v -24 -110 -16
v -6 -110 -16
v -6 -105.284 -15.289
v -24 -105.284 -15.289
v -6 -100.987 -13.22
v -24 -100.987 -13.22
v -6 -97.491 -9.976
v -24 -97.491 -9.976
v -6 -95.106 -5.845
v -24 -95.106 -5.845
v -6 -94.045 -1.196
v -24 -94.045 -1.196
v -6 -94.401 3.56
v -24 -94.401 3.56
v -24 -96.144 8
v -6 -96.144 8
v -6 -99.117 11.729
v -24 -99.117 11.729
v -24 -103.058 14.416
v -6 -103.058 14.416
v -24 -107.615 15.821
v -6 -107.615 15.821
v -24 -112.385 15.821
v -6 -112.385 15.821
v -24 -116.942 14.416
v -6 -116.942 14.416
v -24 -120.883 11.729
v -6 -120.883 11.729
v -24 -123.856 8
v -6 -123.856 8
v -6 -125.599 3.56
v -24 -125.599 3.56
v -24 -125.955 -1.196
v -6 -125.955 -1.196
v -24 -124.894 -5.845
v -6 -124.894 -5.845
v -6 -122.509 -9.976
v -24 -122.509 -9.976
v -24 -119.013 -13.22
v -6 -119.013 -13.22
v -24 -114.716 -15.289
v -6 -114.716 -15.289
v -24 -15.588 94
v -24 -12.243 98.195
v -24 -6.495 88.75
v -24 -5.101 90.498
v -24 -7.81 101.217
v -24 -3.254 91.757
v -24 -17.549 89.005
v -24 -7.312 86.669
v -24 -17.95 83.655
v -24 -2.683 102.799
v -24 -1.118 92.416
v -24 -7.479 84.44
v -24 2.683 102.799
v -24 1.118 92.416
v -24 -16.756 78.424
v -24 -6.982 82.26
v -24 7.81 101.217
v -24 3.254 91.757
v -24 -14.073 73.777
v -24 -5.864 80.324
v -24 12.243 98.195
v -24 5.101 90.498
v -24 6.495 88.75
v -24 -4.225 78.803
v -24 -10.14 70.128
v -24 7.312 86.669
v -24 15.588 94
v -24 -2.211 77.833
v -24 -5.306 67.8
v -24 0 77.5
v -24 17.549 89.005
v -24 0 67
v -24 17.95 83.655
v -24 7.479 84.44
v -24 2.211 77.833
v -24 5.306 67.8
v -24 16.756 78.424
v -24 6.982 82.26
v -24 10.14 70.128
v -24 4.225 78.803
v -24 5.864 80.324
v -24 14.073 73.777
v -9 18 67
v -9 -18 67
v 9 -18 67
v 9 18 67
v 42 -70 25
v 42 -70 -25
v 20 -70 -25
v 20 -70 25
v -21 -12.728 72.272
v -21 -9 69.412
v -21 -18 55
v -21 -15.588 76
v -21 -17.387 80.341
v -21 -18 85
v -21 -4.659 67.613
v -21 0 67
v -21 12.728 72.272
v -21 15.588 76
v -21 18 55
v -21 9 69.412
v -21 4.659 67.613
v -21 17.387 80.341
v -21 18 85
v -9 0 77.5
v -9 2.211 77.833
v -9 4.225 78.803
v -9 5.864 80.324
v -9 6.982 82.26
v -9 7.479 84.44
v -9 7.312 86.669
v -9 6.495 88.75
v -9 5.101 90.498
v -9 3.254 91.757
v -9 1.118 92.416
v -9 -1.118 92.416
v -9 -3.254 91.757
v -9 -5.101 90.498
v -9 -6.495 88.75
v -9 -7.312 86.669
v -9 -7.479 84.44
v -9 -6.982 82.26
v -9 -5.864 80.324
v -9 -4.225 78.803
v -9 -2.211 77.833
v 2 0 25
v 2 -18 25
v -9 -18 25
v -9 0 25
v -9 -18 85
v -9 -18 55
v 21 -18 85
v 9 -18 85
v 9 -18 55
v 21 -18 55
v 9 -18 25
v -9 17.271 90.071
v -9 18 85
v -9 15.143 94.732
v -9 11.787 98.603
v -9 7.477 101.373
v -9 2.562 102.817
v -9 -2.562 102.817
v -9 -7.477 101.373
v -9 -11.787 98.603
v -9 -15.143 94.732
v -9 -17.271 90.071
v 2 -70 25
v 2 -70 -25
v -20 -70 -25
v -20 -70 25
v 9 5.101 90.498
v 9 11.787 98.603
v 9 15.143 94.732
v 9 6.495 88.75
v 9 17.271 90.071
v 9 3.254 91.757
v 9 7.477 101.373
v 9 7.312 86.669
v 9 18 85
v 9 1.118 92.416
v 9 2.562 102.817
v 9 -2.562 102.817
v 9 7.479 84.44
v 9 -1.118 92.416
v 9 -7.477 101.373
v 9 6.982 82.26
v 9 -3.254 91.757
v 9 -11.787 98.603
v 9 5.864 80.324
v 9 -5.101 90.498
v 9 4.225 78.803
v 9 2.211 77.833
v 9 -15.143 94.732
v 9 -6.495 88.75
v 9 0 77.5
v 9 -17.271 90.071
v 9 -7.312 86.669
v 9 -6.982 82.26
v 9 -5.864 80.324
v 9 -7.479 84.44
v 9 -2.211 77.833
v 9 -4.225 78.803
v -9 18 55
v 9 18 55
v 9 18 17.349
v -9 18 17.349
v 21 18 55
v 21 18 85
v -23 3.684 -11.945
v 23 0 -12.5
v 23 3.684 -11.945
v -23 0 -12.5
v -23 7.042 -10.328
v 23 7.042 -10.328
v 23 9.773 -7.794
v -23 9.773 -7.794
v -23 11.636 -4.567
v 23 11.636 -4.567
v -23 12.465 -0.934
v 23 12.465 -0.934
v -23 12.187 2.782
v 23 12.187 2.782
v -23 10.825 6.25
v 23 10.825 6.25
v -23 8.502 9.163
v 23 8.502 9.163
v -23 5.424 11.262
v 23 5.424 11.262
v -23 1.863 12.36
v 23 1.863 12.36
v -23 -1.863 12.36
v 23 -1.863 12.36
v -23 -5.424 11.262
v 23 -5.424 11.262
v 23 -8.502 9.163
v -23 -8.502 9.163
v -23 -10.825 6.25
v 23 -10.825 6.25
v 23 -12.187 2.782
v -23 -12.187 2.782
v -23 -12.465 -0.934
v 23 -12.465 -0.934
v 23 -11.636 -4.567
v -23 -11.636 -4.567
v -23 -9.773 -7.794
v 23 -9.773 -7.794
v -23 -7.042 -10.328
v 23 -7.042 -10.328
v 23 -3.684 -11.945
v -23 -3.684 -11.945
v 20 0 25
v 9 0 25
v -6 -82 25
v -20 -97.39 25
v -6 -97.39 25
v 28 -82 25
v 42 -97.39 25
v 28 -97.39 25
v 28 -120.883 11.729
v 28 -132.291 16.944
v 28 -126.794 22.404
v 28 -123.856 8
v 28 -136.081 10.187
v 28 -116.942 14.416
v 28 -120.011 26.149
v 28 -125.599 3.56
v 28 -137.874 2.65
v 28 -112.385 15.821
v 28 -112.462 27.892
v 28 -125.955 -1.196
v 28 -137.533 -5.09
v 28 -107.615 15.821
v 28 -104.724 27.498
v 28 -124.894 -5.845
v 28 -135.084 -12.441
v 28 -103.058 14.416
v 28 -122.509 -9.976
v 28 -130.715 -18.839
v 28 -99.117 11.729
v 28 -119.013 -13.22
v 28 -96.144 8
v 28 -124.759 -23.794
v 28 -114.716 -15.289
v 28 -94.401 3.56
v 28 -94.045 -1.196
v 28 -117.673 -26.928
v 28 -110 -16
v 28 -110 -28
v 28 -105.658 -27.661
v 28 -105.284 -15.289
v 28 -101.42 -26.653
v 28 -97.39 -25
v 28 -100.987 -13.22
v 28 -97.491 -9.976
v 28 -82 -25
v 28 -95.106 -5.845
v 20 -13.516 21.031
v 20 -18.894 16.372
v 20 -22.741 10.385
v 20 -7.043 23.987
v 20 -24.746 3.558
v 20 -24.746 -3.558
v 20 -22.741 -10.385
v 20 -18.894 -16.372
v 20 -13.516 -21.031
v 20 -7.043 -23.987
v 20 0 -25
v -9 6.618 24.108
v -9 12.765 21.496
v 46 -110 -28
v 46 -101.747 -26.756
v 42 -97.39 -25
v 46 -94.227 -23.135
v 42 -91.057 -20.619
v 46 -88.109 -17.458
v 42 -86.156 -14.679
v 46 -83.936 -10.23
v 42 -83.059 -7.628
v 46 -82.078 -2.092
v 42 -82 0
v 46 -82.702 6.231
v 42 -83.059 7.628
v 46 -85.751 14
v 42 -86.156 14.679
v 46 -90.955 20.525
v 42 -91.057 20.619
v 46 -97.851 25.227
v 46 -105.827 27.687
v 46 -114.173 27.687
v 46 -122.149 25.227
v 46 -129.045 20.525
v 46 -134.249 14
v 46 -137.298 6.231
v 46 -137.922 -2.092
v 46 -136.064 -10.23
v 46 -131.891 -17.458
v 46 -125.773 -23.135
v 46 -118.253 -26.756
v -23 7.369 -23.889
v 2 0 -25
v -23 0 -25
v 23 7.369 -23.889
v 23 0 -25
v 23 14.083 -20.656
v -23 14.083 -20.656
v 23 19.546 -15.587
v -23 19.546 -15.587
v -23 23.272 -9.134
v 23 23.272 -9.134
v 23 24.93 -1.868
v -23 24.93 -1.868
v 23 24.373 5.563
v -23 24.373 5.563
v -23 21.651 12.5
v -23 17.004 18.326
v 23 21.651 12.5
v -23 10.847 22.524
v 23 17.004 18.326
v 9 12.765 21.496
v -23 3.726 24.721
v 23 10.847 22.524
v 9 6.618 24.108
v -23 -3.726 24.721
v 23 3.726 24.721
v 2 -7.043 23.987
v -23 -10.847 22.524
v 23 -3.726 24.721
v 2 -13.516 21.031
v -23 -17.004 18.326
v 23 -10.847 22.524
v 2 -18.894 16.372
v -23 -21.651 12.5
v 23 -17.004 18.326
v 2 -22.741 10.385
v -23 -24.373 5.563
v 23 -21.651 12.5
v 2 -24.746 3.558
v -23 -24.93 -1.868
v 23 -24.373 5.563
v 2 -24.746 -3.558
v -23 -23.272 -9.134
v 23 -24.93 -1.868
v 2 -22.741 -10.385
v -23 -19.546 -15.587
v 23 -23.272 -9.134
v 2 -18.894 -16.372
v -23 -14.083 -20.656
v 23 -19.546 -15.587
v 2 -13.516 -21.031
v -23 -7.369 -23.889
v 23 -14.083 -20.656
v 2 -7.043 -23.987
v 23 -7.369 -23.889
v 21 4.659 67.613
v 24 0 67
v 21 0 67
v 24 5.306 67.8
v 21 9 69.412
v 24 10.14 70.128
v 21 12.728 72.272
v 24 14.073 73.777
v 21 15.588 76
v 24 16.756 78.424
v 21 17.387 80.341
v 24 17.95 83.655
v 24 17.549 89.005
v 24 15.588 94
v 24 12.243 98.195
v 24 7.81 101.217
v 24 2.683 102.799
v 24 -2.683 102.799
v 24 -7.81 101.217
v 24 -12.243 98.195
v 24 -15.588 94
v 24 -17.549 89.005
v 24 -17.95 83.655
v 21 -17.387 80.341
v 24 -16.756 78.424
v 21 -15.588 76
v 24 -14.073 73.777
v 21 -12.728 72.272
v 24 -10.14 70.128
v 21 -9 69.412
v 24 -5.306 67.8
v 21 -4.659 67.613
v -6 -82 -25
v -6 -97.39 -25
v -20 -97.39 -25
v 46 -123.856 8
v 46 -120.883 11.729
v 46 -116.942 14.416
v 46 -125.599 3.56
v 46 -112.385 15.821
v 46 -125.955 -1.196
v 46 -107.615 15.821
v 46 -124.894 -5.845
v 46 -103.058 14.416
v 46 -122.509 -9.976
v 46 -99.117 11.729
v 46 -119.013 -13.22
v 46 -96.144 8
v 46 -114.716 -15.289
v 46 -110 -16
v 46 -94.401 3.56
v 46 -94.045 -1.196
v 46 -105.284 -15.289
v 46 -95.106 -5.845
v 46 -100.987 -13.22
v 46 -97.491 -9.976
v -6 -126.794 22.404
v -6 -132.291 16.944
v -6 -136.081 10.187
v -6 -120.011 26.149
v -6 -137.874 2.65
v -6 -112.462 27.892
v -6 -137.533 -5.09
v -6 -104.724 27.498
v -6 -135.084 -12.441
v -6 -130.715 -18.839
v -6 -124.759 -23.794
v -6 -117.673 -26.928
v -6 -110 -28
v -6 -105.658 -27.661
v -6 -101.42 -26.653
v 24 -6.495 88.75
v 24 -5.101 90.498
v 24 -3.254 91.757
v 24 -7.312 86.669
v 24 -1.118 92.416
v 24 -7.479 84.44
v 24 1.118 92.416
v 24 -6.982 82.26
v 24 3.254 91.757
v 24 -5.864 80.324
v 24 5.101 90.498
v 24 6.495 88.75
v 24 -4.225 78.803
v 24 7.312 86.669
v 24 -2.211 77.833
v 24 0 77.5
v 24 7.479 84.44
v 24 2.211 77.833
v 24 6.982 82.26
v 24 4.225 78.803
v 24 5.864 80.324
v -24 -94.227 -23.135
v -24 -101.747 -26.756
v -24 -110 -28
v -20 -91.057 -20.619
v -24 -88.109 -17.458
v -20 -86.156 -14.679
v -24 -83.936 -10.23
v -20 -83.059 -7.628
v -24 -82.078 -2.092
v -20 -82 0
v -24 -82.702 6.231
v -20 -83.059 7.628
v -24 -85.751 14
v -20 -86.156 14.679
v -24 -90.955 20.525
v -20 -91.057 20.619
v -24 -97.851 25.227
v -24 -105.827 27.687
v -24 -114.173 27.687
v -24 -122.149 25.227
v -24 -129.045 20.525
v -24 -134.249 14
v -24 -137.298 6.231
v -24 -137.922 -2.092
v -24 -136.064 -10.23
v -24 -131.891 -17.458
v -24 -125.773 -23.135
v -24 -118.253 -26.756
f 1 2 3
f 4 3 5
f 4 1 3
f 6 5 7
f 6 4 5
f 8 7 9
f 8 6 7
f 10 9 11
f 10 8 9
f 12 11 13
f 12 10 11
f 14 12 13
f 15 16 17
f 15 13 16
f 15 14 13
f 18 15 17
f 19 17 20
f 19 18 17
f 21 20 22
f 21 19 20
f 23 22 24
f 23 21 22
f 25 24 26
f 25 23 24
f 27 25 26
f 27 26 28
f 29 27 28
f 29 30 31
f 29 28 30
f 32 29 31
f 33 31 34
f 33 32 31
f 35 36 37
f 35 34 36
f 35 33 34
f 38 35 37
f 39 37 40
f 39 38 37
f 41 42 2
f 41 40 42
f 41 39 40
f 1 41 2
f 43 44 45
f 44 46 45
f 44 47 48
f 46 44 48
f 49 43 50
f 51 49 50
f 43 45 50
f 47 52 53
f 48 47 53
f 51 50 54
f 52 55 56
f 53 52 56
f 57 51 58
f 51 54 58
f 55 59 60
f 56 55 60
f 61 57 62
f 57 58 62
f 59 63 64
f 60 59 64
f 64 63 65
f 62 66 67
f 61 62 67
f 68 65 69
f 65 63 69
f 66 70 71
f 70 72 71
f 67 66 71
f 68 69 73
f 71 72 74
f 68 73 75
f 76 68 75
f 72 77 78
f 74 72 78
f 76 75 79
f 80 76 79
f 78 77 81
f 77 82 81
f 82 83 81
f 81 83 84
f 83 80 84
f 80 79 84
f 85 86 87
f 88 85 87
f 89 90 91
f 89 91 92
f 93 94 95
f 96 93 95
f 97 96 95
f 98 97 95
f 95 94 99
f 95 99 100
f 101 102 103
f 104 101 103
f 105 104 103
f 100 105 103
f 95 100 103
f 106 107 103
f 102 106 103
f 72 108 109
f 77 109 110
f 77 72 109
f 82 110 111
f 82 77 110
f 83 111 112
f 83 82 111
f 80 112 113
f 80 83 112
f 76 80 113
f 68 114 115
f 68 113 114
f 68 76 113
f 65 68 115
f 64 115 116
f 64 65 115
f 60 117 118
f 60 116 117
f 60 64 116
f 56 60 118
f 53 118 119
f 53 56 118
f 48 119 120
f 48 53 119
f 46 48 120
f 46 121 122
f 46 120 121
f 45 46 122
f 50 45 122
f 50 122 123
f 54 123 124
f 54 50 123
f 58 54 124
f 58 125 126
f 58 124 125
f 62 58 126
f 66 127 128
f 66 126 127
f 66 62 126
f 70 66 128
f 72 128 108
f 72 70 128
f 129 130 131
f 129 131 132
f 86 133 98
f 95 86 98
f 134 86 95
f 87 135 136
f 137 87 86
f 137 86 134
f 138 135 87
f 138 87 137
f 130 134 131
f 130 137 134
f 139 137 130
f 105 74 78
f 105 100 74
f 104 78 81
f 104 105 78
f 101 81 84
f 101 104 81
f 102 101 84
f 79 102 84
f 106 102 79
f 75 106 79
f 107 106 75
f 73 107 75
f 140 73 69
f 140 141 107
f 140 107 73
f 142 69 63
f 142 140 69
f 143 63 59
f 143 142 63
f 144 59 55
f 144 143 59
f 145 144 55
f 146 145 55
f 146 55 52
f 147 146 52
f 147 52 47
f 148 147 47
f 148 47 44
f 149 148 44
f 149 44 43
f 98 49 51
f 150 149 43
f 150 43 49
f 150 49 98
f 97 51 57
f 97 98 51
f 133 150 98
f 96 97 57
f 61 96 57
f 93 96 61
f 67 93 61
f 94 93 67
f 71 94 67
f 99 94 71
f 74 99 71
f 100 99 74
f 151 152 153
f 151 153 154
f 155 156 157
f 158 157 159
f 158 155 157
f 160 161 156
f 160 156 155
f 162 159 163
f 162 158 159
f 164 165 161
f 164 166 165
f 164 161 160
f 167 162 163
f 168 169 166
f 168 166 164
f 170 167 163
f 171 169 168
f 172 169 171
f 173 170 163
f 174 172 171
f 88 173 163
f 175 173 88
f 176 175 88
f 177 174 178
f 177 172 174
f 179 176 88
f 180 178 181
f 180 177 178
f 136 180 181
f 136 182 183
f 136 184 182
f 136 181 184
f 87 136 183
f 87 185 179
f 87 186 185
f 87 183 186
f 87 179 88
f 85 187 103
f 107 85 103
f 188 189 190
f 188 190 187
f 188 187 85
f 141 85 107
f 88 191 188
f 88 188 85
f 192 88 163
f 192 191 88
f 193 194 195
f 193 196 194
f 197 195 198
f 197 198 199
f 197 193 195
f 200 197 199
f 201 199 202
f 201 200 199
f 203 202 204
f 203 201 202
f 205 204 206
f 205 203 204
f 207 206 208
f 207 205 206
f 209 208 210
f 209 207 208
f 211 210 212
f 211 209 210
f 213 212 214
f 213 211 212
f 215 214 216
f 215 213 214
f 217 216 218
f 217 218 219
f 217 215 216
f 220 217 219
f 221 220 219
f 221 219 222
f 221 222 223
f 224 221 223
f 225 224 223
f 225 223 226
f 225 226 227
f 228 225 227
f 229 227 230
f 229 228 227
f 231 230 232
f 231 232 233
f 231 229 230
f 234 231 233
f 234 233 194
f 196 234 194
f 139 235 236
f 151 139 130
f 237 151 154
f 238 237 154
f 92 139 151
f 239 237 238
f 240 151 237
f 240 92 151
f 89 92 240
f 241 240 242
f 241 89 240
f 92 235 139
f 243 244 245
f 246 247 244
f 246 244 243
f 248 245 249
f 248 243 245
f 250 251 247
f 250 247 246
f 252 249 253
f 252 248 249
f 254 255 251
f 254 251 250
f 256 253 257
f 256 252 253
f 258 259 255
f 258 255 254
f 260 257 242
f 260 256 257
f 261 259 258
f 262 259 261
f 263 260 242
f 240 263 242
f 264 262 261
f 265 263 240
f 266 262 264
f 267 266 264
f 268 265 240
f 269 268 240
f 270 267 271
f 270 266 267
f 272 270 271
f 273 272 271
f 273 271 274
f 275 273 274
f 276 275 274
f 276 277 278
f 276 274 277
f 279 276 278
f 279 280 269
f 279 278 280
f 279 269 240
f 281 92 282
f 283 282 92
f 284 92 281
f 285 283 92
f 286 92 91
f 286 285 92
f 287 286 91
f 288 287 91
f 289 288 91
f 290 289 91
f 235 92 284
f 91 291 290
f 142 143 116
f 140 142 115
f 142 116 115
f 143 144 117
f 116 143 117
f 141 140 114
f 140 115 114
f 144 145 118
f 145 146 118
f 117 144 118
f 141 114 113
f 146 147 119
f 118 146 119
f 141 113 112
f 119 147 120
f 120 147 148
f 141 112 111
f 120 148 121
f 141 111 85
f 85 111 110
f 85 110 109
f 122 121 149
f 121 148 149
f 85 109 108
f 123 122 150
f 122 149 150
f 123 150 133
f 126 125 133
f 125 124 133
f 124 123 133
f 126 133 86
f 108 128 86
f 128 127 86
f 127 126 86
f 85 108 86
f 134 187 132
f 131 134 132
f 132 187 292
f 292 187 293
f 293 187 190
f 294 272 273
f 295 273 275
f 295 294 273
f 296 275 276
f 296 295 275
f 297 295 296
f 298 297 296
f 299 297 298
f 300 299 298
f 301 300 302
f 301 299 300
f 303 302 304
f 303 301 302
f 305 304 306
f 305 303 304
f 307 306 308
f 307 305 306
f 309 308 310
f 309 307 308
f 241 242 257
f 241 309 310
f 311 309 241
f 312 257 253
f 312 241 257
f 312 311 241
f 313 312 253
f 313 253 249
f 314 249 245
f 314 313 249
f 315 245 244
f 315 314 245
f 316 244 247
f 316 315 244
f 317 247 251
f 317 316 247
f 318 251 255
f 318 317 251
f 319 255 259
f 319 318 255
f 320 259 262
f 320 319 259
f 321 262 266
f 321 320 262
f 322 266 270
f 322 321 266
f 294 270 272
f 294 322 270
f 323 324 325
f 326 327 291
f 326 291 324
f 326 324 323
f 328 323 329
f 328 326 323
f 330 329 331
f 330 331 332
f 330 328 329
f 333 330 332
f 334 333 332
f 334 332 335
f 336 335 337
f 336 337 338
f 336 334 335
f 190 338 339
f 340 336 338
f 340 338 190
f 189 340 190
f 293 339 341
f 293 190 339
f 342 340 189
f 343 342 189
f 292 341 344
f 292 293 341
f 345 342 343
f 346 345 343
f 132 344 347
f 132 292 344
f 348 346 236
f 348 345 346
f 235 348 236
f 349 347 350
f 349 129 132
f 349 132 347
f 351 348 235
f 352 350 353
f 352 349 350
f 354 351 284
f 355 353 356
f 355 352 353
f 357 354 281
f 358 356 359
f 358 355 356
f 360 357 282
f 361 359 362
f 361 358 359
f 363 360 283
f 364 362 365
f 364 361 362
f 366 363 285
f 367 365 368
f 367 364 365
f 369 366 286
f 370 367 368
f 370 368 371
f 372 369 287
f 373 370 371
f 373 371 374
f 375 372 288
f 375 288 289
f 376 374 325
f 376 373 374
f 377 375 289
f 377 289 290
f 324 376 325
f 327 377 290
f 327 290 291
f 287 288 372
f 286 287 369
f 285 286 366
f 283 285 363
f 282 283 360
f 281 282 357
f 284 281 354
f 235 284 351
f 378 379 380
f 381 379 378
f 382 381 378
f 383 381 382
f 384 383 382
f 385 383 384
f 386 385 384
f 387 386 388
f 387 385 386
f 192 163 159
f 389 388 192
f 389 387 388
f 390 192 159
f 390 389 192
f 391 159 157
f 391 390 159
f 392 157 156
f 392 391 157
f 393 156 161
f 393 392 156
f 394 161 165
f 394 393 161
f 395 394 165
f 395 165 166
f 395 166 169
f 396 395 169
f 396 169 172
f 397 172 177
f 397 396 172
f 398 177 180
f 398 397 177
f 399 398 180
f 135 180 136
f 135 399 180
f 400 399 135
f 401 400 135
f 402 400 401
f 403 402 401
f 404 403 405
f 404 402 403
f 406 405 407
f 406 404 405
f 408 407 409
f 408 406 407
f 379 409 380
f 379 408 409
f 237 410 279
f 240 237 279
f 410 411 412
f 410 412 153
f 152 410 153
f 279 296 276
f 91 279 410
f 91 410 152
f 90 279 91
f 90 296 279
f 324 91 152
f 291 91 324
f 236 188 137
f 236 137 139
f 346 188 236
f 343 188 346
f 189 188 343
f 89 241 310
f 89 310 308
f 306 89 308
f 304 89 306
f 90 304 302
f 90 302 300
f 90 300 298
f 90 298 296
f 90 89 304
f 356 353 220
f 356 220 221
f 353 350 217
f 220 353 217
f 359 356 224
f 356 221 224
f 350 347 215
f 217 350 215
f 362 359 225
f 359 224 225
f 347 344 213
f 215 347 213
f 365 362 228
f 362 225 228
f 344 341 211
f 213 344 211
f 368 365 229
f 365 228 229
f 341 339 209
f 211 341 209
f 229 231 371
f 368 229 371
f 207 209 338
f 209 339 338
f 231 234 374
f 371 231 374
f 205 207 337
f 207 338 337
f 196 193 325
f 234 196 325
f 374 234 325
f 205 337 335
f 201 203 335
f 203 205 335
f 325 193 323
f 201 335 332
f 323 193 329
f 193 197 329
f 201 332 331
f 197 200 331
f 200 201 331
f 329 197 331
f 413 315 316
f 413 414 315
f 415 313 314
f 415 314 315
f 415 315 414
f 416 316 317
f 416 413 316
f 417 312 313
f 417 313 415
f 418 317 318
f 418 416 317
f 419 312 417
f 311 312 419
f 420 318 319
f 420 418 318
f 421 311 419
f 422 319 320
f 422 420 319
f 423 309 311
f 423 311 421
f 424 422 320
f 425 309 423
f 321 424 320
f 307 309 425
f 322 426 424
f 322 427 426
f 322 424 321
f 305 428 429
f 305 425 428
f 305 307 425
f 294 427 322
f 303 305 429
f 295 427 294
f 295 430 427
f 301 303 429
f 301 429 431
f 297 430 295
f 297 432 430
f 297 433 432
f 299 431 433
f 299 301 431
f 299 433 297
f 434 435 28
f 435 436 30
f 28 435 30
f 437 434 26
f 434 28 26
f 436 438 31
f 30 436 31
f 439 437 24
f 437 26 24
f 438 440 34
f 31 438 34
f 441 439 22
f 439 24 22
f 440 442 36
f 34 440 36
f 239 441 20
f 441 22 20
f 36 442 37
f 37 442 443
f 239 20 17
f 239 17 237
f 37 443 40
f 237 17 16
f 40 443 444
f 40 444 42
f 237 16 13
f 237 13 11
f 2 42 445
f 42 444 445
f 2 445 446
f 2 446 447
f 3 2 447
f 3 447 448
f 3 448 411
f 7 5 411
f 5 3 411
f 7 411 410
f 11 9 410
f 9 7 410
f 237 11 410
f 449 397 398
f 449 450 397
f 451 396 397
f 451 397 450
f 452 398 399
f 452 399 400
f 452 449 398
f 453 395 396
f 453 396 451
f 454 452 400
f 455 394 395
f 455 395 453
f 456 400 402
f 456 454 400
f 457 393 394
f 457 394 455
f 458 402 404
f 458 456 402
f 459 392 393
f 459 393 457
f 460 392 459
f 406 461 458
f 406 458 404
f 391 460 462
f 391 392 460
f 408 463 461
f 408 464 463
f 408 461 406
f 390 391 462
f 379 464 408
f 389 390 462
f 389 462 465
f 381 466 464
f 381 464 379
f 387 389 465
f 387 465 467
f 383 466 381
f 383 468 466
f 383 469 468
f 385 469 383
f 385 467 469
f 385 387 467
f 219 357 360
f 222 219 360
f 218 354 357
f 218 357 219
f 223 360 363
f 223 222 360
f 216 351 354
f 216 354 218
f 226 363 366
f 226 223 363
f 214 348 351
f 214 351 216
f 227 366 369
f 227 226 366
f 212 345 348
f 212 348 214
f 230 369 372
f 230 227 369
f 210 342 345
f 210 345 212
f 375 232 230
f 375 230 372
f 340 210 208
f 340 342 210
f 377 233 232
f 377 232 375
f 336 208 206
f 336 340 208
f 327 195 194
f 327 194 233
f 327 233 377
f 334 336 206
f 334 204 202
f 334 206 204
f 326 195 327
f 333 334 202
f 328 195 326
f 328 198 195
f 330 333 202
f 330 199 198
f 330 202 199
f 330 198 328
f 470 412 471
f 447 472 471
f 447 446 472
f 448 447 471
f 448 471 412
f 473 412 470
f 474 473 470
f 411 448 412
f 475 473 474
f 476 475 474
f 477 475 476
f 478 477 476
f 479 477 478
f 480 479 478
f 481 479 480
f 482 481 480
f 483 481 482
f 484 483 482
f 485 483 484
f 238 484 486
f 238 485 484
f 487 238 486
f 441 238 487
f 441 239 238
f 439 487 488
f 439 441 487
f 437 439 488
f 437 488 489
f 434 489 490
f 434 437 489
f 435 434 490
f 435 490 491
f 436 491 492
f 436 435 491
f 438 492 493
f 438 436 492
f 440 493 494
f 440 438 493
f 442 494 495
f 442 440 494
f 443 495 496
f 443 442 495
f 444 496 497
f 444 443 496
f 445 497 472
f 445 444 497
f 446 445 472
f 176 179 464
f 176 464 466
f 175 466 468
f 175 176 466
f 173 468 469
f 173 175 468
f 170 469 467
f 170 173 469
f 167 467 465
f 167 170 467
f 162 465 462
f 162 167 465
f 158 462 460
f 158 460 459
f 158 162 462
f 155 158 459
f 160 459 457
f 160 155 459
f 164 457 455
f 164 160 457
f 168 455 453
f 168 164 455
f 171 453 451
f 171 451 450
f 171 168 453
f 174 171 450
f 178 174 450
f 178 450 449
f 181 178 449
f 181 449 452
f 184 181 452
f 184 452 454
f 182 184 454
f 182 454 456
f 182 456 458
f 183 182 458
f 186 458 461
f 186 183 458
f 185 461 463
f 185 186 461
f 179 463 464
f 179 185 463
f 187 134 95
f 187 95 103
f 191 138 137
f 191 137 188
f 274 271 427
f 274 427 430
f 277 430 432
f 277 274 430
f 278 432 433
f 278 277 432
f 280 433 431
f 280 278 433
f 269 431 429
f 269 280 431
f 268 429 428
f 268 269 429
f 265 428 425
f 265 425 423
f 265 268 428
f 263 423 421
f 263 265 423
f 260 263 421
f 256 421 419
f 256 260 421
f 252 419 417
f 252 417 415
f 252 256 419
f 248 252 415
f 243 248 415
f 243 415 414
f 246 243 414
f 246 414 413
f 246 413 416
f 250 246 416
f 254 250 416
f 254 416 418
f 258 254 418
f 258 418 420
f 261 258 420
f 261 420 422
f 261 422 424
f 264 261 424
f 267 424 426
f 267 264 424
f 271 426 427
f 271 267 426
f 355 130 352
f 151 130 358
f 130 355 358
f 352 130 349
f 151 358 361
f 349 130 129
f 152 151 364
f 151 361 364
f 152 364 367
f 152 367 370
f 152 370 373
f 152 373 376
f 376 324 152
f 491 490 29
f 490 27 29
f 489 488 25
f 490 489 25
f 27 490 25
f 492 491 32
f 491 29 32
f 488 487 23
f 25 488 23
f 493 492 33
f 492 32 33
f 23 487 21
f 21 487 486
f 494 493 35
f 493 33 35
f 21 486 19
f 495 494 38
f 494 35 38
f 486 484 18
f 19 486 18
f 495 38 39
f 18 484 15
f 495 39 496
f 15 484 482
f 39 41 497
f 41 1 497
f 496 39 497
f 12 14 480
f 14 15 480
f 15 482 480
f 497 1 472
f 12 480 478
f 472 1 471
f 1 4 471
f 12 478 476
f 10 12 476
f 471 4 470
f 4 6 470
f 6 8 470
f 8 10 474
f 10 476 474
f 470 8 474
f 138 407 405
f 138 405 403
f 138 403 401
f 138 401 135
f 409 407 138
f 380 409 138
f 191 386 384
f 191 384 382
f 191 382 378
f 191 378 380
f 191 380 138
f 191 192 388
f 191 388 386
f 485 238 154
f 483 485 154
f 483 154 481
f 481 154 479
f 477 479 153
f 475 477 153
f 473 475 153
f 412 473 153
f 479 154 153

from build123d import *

# Parameters (mm, degrees)
SKETCH1_R               = 25
SKETCH1_R_2             = 12.5
BOSS_EXTRUDE1_DEPTH     = 23
BOSS_EXTRUDE3_START     = 20
BOSS_EXTRUDE3_DEPTH     = 18
SKETCH5_R               = 16
BOSS_EXTRUDE4_DEPTH     = 35
BOSS_EXTRUDE5_DEPTH     = 31
CUT_EXTRUDE2_DEPTH      = 155.819249449
CUT_EXTRUDE2_DEPTH_BACK = 155.819249449
SKETCH6_W               = 34
SKETCH6_H               = 70
SKETCH8_R               = 18
SKETCH8_R_2             = 7.5
BOSS_EXTRUDE6_DEPTH     = 24
BOSS_EXTRUDE7_DEPTH     = 21
BOSS_EXTRUDE8_DEPTH     = 9
CUT_EXTRUDE4_DEPTH      = 193.512337267
CUT_EXTRUDE4_DEPTH_BACK = 193.512337267
SKETCH10_W              = 18
SKETCH10_H              = 50


with BuildPart() as part:
    # Sketch1 → Boss-Extrude1 (new, symmetric)
    with BuildSketch(Plane(origin=(0, 0, 0), x_dir=(0, 0, -1), z_dir=(1, 0, 0))):
        Circle(SKETCH1_R)
        Circle(SKETCH1_R_2, mode=Mode.SUBTRACT)
    extrude(amount=BOSS_EXTRUDE1_DEPTH, both=True)

    # Sketch4 → Boss-Extrude3 (add)
    with BuildSketch(Plane(origin=(0, 0, 0), x_dir=(0, 0, -1), z_dir=(1, 0, 0)).offset(BOSS_EXTRUDE3_START)):
        with BuildLine():
            Line((-25, 0), (-25, -70))
            Line((-25, -70), (25, -70))
            Line((25, -70), (25, 0))
            ThreePointArc((25, 0), (0, -25), (-25, 0))
        make_face()
    extrude(amount=-BOSS_EXTRUDE3_DEPTH)



with BuildPart() as body_2:
    # Sketch5 → Boss-Extrude4 (new, symmetric)
    with BuildSketch(Plane(origin=(11, 0, 0), x_dir=(0, 0, -1), z_dir=(1, 0, 0))):
        with BuildLine():
            ThreePointArc((25, -97.390479787), (0, -82), (-25, -97.390479787))
            ThreePointArc((-25, -97.390479787), (-6.480740698, -137.239676944), (28, -110))
            ThreePointArc((28, -110), (27.239676944, -103.519259302), (25, -97.390479787))
        make_face()
        with Locations((0, -110)):
            Circle(SKETCH5_R, mode=Mode.SUBTRACT)
    extrude(amount=BOSS_EXTRUDE4_DEPTH, both=True)


with BuildPart() as part_1:
    add(part.part)

    add(body_2.part)  # Boss-Extrude5 merges body 2
    # Sketch5<4> → Boss-Extrude5 (add, symmetric)
    with BuildSketch(Plane(origin=(11, 0, 0), x_dir=(0, 0, -1), z_dir=(1, 0, 0))):
        with BuildLine():
            Line((-25, -70), (-25, -97.390479787))
            ThreePointArc((-25, -97.390479787), (0, -82), (25, -97.390479787))
            Line((25, -97.390479787), (25, -70))
            Line((25, -70), (-25, -70))
        make_face()
    extrude(amount=BOSS_EXTRUDE5_DEPTH, both=True)

    # Sketch6 → Cut-Extrude2 (cut, two sides: drawn at the far end of the back side and taken through both)
    with BuildSketch(Plane.XY.offset(25).offset(-CUT_EXTRUDE2_DEPTH_BACK)):
        with Locations((11, -117)):
            Rectangle(SKETCH6_W, SKETCH6_H)
    extrude(amount=CUT_EXTRUDE2_DEPTH + CUT_EXTRUDE2_DEPTH_BACK, mode=Mode.SUBTRACT)



with BuildPart() as body_2_2:
    # Sketch8 → Boss-Extrude6 (new, symmetric)
    with BuildSketch(Plane(origin=(0, 0, 0), x_dir=(0, 0, -1), z_dir=(1, 0, 0))):
        with Locations((-85, 0)):
            Circle(SKETCH8_R)
        with Locations((-85, 0)):
            Circle(SKETCH8_R_2, mode=Mode.SUBTRACT)
    extrude(amount=BOSS_EXTRUDE6_DEPTH, both=True)

    # Sketch9 → Boss-Extrude7 (add, symmetric)
    with BuildSketch(Plane(origin=(0, 0, 0), x_dir=(0, 0, -1), z_dir=(1, 0, 0))):
        with BuildLine():
            Line((-55, 18), (-85, 18))
            ThreePointArc((-85, 18), (-67, 0), (-85, -18))
            Line((-85, -18), (-55, -18))
            Line((-55, -18), (-55, 18))
        make_face()
    extrude(amount=BOSS_EXTRUDE7_DEPTH, both=True)


with BuildPart() as part_2:
    add(part_1.part)

    add(body_2_2.part)  # Boss-Extrude8 merges body 2 2
    # Sketch9<3> → Boss-Extrude8 (add, symmetric)
    with BuildSketch(Plane(origin=(0, 0, 0), x_dir=(0, 0, -1), z_dir=(1, 0, 0))):
        with BuildLine():
            Line((-17.349351573, 18), (-55, 18))
            Line((-55, 18), (-55, -18))
            Line((-55, -18), (-25, -18))
            Line((-25, -18), (-25, 0))
            ThreePointArc((-25, 0), (-23.007974588, 9.779218033), (-17.349351573, 18))
        make_face()
    extrude(amount=BOSS_EXTRUDE8_DEPTH, both=True)

    # Sketch10 → Cut-Extrude4 (cut, two sides: drawn at the far end of the back side and taken through both)
    with BuildSketch(Plane(origin=(0, 18, 0), x_dir=(1, 0, 0), z_dir=(0, 1, 0)).offset(-CUT_EXTRUDE4_DEPTH_BACK)):
        with Locations((0, -92)):
            Rectangle(SKETCH10_W, SKETCH10_H)
    extrude(amount=CUT_EXTRUDE4_DEPTH + CUT_EXTRUDE4_DEPTH_BACK, mode=Mode.SUBTRACT)


solid = part_2.part
